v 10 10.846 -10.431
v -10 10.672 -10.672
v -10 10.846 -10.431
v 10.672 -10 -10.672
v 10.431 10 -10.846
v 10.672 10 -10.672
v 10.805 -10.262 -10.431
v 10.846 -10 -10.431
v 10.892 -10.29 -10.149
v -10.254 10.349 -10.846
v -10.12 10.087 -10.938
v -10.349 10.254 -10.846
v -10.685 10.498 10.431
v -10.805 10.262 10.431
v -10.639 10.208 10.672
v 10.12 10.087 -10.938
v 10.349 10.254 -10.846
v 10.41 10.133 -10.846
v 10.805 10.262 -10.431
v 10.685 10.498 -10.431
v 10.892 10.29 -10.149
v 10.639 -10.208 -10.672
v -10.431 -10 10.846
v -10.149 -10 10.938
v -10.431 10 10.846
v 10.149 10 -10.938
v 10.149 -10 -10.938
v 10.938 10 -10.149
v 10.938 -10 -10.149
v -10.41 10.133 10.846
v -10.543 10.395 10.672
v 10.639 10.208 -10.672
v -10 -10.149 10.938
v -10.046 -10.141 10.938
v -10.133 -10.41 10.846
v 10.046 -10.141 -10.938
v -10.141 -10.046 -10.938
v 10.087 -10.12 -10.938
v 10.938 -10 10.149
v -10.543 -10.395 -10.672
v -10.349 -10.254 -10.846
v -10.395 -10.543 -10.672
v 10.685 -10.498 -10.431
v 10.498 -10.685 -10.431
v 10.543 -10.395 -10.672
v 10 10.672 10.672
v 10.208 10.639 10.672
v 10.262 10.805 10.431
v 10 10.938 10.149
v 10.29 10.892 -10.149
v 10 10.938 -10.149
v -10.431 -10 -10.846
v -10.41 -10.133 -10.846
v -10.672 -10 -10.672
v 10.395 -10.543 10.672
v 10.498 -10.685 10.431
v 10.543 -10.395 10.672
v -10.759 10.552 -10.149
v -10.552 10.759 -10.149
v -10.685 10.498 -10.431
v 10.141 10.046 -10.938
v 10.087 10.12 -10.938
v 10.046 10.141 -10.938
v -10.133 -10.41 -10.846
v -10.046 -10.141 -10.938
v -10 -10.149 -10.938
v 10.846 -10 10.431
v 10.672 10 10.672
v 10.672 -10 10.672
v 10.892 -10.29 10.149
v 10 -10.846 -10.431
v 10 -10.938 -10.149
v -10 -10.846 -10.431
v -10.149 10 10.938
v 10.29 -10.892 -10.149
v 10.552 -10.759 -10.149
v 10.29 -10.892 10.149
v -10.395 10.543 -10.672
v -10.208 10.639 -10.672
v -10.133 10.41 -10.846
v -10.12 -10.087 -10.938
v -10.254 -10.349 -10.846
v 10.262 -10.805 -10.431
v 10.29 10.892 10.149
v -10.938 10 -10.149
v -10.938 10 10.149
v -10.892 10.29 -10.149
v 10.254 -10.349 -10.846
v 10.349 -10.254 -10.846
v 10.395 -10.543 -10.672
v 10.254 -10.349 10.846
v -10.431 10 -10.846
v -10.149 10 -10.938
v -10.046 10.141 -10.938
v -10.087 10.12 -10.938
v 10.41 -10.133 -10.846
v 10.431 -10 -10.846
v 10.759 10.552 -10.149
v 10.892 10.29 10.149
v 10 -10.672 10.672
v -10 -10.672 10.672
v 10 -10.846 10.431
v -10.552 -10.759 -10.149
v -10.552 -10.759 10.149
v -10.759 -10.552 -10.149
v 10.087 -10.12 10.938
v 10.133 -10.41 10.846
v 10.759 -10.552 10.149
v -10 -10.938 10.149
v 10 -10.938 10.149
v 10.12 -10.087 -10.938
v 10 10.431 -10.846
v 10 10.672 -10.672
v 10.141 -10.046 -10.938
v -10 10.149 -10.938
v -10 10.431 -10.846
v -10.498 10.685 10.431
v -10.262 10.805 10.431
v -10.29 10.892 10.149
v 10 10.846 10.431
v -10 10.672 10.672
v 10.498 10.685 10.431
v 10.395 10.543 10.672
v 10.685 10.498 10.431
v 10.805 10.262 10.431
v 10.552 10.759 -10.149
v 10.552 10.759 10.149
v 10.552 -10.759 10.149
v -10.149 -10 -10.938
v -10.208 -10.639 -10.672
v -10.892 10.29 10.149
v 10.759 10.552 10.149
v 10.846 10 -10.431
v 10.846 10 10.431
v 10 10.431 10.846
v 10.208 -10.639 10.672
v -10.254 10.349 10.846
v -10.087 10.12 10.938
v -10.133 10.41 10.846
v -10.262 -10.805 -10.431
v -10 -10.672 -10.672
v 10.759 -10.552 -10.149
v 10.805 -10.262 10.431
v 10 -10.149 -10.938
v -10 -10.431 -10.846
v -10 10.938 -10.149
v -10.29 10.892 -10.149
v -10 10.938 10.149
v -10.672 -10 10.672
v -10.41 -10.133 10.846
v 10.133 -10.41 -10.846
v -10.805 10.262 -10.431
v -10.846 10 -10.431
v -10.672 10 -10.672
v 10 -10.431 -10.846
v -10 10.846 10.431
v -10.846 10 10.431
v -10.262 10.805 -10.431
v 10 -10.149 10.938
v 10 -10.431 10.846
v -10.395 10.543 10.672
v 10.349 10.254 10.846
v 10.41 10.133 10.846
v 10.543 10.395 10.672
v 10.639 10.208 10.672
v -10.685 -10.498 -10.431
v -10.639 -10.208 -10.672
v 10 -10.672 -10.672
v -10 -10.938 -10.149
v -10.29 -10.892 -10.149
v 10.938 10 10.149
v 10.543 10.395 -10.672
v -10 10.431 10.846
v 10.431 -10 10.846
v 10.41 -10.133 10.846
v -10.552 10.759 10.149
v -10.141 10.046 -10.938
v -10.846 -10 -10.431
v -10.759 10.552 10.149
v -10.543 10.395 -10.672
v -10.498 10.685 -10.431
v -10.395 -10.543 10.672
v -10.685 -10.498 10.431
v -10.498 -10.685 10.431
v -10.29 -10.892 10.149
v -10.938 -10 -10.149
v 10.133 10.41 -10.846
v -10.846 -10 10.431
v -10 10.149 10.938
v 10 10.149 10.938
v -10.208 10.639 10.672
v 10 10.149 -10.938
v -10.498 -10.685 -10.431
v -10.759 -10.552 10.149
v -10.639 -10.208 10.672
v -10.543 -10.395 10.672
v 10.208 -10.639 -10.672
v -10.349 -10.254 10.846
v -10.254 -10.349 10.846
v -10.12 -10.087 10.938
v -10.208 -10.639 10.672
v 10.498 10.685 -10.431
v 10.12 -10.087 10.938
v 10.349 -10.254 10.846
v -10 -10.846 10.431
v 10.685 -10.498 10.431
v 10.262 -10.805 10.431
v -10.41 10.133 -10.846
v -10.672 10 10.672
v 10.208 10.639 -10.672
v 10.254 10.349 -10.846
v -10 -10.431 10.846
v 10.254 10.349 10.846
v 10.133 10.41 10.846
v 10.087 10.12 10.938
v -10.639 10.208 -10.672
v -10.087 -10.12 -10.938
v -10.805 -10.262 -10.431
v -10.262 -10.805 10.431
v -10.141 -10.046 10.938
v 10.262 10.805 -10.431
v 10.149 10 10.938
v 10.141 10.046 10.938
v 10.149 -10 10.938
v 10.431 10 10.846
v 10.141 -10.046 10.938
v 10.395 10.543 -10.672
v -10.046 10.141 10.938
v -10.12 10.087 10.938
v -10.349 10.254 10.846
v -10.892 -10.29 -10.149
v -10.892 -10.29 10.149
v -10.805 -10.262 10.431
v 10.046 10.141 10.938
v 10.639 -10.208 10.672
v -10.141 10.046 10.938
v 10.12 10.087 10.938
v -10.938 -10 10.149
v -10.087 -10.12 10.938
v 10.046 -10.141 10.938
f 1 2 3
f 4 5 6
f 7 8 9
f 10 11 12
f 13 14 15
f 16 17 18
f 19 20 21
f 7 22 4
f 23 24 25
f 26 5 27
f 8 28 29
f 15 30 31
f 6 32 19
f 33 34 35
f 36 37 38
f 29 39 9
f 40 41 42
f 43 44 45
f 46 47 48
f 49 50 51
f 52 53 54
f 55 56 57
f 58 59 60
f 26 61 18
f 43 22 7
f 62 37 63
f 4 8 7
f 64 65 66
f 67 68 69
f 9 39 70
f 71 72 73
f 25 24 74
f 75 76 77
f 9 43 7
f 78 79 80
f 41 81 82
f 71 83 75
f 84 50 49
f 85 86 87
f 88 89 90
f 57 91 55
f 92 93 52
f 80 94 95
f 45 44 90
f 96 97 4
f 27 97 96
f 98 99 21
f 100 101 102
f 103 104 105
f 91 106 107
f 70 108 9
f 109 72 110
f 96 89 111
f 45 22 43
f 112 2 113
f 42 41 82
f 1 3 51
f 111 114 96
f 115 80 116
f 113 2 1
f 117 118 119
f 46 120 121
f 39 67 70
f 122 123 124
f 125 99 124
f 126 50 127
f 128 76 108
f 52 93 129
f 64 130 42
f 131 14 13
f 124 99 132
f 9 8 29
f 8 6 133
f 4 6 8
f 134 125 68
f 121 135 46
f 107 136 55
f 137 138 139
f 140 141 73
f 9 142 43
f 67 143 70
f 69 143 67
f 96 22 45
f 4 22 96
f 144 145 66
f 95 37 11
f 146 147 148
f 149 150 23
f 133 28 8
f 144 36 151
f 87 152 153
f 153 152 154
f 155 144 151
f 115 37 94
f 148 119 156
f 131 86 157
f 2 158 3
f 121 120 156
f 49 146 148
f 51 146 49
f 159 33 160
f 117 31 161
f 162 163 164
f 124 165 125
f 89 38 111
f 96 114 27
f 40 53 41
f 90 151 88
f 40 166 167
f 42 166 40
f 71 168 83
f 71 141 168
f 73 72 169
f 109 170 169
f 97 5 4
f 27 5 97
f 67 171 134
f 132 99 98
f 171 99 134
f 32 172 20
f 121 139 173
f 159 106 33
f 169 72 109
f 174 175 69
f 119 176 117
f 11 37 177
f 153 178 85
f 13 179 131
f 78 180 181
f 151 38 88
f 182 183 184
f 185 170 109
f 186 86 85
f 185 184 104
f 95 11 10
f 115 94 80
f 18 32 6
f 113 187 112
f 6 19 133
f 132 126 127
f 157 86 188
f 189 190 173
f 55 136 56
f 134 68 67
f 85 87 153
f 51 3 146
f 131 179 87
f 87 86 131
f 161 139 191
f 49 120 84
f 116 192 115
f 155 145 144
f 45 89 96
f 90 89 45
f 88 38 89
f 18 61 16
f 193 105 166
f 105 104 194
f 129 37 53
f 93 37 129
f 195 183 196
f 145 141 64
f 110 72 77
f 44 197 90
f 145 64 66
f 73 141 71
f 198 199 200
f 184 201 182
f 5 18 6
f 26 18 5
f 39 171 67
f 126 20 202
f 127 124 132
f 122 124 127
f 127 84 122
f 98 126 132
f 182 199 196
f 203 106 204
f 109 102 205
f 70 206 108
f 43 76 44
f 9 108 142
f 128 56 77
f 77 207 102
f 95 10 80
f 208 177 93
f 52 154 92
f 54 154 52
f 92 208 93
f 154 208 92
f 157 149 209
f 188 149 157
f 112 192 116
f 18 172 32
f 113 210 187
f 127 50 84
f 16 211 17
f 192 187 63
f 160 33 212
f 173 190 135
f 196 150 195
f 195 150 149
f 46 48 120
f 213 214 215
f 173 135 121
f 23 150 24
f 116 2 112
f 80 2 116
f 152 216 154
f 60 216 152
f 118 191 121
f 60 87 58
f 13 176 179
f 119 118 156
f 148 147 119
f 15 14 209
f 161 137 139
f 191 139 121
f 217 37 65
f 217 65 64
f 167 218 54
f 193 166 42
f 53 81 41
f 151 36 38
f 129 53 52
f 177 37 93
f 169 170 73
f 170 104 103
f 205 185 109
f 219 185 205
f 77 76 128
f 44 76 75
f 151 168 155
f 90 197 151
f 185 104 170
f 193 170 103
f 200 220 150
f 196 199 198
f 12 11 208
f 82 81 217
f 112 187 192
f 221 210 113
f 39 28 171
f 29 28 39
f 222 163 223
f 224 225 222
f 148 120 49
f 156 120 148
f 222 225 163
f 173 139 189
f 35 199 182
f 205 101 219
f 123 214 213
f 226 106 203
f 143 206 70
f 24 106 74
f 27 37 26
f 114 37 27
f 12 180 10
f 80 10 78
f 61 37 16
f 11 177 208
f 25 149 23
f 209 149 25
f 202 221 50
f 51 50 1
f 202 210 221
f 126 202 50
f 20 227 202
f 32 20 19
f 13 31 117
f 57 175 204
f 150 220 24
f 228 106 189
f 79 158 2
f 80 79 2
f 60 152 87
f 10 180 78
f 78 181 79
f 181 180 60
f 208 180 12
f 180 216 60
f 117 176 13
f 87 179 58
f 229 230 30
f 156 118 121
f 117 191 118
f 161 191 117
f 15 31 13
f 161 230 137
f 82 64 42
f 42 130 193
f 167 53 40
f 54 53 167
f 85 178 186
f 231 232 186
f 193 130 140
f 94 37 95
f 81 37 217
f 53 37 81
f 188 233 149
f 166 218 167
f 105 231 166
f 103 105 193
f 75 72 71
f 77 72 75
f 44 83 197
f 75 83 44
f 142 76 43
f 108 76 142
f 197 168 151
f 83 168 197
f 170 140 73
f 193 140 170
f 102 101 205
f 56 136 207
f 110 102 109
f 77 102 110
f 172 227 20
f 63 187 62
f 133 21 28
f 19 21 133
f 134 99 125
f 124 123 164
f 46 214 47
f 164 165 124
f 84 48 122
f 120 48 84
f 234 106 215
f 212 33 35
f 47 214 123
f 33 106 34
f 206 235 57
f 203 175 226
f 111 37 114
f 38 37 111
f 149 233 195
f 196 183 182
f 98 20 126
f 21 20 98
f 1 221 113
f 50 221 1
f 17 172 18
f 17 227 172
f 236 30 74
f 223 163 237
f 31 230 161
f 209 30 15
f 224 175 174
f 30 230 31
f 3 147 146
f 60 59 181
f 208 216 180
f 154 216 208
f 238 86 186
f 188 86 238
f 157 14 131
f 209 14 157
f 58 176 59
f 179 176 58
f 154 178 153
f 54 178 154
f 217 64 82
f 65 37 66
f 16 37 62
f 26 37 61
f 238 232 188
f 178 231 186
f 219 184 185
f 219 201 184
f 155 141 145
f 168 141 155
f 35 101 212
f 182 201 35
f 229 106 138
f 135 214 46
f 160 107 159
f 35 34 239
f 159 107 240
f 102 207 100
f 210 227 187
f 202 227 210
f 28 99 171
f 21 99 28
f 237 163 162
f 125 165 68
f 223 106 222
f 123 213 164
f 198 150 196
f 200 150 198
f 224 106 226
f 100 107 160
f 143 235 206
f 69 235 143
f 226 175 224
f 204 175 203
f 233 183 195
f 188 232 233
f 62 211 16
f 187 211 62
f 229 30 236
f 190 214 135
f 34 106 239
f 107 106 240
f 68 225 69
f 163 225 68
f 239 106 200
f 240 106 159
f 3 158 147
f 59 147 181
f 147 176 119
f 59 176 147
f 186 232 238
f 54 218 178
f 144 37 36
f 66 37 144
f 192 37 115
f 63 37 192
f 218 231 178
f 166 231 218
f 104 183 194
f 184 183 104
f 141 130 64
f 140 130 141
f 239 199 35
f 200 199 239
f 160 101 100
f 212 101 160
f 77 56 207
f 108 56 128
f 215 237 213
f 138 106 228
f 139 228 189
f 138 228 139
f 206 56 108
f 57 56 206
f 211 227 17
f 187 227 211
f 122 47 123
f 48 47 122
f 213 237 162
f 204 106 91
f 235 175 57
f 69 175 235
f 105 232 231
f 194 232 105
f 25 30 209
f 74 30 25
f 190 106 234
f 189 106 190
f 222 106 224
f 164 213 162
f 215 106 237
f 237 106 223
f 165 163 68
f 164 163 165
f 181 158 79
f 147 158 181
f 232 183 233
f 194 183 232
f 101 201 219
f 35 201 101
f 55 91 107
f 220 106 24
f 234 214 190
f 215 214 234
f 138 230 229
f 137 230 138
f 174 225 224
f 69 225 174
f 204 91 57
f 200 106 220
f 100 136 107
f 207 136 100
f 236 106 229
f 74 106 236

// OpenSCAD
r = 2; gap = 0.4;   // two statements on one line
minkowski() {
    cube([20, 20, 20], center = true);
    sphere(r = (r - 0.5 + gap) / 2, $fn = 20);
}
